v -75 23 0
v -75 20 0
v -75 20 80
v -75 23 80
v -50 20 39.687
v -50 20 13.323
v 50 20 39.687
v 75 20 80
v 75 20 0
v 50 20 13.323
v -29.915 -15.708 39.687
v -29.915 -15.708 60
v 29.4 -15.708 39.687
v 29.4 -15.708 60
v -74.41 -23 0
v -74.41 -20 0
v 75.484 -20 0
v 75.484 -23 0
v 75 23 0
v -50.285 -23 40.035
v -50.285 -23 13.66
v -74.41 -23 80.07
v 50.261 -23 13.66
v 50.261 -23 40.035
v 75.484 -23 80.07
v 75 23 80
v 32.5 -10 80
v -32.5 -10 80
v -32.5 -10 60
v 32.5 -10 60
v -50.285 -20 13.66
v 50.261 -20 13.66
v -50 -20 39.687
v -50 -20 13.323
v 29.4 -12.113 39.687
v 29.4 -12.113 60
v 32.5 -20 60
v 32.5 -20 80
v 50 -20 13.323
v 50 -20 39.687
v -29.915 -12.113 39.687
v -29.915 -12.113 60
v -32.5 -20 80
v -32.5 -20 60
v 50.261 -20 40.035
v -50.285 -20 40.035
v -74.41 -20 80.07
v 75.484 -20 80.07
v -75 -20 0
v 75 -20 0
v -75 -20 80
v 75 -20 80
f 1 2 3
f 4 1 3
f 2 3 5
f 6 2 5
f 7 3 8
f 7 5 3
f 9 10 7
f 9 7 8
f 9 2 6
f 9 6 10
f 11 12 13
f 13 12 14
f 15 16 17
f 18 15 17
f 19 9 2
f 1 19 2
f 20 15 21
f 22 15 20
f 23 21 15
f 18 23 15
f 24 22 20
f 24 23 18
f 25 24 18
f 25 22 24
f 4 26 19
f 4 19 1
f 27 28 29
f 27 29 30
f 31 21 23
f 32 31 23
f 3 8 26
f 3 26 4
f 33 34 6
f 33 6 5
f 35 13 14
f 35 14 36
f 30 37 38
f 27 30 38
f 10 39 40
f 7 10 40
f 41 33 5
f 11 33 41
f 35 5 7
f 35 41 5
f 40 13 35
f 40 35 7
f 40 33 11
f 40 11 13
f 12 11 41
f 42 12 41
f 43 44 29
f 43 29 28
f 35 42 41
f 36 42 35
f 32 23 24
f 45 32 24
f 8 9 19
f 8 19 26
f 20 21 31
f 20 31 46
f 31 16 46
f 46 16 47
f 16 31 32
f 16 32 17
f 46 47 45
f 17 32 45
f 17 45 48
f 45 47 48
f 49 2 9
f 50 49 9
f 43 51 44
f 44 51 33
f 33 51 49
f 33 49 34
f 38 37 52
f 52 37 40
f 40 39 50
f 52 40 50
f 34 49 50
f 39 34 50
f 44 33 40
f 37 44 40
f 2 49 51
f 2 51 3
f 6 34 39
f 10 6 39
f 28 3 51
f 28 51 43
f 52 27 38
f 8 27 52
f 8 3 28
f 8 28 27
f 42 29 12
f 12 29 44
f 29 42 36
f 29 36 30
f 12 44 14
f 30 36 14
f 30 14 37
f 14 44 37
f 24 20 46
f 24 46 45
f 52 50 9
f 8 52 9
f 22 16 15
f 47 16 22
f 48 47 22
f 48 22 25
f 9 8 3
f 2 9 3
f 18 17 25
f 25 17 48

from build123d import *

# Parameters (mm, degrees)
F0_W      = 150
F0_H      = 40
F1_DEPTH  = 80
F2_W      = 65
F2_H      = 20
F4_DEPTH  = 10
F5_W      = 100
F5_H      = 26.3639663465
F7_DEPTH  = 53.3
F8_W      = 59.3146178871
F8_H      = 3.5946303979
F9_DEPTH  = 25
F10_W     = 149.8942822218
F10_H     = 80.0698846579
F11_DEPTH = 3
F12_W     = 100.5468443036
F12_H     = 26.3744816184
F13_DEPTH = 177.9
F14_W     = 150
F14_H     = 80
F15_DEPTH = 3


with BuildPart() as f1:
    # F0 (on Top) → F1 (new body)
    with BuildSketch(Plane.XY):
        Rectangle(F0_W, F0_H)
    extrude(amount=F1_DEPTH)

    # F2 (on face) → F4 (cut)
    with BuildSketch(Plane.XZ.offset(20)):
        with Locations((0, 70)):
            Rectangle(F2_W, F2_H)
    extrude(amount=-F4_DEPTH, mode=Mode.SUBTRACT)

    # F5 (on face) → F7 (cut)
    with BuildSketch(Plane.XZ.offset(20)):
        with Locations((0, 26.5054549091)):
            Rectangle(F5_W, F5_H)
    extrude(amount=-F7_DEPTH, mode=Mode.SUBTRACT)

    # F8 (on face) → F9 (cut)
    with BuildSketch(Plane.XY.offset(60)):
        with Locations((-0.2572024241, -13.9103080146)):
            Rectangle(F8_W, F8_H)
    extrude(amount=-F9_DEPTH, mode=Mode.SUBTRACT)


with BuildPart() as f11:
    # F10 (on face) → F11 (new body)
    with BuildSketch(Plane.XZ.offset(20)):
        with Locations((0.5370080471, 40.0349423289)):
            Rectangle(F10_W, F10_H)
    extrude(amount=F11_DEPTH)

    # F12 (on face) → F13 (cut)
    with BuildSketch(Plane.XZ.offset(23)):
        with Locations((-0.0120140612, 26.8477015197)):
            Rectangle(F12_W, F12_H)
    extrude(amount=-F13_DEPTH, mode=Mode.SUBTRACT)


with BuildPart() as f15:
    # F14 (on face) → F15 (new body)
    with BuildSketch(Plane(origin=(0, 20, 0), x_dir=(-1, 0, 0), z_dir=(0, 1, 0))):
        with Locations((0, 40)):
            Rectangle(F14_W, F14_H)
    extrude(amount=F15_DEPTH)


solid = Compound([f1.part, f11.part, f15.part])
